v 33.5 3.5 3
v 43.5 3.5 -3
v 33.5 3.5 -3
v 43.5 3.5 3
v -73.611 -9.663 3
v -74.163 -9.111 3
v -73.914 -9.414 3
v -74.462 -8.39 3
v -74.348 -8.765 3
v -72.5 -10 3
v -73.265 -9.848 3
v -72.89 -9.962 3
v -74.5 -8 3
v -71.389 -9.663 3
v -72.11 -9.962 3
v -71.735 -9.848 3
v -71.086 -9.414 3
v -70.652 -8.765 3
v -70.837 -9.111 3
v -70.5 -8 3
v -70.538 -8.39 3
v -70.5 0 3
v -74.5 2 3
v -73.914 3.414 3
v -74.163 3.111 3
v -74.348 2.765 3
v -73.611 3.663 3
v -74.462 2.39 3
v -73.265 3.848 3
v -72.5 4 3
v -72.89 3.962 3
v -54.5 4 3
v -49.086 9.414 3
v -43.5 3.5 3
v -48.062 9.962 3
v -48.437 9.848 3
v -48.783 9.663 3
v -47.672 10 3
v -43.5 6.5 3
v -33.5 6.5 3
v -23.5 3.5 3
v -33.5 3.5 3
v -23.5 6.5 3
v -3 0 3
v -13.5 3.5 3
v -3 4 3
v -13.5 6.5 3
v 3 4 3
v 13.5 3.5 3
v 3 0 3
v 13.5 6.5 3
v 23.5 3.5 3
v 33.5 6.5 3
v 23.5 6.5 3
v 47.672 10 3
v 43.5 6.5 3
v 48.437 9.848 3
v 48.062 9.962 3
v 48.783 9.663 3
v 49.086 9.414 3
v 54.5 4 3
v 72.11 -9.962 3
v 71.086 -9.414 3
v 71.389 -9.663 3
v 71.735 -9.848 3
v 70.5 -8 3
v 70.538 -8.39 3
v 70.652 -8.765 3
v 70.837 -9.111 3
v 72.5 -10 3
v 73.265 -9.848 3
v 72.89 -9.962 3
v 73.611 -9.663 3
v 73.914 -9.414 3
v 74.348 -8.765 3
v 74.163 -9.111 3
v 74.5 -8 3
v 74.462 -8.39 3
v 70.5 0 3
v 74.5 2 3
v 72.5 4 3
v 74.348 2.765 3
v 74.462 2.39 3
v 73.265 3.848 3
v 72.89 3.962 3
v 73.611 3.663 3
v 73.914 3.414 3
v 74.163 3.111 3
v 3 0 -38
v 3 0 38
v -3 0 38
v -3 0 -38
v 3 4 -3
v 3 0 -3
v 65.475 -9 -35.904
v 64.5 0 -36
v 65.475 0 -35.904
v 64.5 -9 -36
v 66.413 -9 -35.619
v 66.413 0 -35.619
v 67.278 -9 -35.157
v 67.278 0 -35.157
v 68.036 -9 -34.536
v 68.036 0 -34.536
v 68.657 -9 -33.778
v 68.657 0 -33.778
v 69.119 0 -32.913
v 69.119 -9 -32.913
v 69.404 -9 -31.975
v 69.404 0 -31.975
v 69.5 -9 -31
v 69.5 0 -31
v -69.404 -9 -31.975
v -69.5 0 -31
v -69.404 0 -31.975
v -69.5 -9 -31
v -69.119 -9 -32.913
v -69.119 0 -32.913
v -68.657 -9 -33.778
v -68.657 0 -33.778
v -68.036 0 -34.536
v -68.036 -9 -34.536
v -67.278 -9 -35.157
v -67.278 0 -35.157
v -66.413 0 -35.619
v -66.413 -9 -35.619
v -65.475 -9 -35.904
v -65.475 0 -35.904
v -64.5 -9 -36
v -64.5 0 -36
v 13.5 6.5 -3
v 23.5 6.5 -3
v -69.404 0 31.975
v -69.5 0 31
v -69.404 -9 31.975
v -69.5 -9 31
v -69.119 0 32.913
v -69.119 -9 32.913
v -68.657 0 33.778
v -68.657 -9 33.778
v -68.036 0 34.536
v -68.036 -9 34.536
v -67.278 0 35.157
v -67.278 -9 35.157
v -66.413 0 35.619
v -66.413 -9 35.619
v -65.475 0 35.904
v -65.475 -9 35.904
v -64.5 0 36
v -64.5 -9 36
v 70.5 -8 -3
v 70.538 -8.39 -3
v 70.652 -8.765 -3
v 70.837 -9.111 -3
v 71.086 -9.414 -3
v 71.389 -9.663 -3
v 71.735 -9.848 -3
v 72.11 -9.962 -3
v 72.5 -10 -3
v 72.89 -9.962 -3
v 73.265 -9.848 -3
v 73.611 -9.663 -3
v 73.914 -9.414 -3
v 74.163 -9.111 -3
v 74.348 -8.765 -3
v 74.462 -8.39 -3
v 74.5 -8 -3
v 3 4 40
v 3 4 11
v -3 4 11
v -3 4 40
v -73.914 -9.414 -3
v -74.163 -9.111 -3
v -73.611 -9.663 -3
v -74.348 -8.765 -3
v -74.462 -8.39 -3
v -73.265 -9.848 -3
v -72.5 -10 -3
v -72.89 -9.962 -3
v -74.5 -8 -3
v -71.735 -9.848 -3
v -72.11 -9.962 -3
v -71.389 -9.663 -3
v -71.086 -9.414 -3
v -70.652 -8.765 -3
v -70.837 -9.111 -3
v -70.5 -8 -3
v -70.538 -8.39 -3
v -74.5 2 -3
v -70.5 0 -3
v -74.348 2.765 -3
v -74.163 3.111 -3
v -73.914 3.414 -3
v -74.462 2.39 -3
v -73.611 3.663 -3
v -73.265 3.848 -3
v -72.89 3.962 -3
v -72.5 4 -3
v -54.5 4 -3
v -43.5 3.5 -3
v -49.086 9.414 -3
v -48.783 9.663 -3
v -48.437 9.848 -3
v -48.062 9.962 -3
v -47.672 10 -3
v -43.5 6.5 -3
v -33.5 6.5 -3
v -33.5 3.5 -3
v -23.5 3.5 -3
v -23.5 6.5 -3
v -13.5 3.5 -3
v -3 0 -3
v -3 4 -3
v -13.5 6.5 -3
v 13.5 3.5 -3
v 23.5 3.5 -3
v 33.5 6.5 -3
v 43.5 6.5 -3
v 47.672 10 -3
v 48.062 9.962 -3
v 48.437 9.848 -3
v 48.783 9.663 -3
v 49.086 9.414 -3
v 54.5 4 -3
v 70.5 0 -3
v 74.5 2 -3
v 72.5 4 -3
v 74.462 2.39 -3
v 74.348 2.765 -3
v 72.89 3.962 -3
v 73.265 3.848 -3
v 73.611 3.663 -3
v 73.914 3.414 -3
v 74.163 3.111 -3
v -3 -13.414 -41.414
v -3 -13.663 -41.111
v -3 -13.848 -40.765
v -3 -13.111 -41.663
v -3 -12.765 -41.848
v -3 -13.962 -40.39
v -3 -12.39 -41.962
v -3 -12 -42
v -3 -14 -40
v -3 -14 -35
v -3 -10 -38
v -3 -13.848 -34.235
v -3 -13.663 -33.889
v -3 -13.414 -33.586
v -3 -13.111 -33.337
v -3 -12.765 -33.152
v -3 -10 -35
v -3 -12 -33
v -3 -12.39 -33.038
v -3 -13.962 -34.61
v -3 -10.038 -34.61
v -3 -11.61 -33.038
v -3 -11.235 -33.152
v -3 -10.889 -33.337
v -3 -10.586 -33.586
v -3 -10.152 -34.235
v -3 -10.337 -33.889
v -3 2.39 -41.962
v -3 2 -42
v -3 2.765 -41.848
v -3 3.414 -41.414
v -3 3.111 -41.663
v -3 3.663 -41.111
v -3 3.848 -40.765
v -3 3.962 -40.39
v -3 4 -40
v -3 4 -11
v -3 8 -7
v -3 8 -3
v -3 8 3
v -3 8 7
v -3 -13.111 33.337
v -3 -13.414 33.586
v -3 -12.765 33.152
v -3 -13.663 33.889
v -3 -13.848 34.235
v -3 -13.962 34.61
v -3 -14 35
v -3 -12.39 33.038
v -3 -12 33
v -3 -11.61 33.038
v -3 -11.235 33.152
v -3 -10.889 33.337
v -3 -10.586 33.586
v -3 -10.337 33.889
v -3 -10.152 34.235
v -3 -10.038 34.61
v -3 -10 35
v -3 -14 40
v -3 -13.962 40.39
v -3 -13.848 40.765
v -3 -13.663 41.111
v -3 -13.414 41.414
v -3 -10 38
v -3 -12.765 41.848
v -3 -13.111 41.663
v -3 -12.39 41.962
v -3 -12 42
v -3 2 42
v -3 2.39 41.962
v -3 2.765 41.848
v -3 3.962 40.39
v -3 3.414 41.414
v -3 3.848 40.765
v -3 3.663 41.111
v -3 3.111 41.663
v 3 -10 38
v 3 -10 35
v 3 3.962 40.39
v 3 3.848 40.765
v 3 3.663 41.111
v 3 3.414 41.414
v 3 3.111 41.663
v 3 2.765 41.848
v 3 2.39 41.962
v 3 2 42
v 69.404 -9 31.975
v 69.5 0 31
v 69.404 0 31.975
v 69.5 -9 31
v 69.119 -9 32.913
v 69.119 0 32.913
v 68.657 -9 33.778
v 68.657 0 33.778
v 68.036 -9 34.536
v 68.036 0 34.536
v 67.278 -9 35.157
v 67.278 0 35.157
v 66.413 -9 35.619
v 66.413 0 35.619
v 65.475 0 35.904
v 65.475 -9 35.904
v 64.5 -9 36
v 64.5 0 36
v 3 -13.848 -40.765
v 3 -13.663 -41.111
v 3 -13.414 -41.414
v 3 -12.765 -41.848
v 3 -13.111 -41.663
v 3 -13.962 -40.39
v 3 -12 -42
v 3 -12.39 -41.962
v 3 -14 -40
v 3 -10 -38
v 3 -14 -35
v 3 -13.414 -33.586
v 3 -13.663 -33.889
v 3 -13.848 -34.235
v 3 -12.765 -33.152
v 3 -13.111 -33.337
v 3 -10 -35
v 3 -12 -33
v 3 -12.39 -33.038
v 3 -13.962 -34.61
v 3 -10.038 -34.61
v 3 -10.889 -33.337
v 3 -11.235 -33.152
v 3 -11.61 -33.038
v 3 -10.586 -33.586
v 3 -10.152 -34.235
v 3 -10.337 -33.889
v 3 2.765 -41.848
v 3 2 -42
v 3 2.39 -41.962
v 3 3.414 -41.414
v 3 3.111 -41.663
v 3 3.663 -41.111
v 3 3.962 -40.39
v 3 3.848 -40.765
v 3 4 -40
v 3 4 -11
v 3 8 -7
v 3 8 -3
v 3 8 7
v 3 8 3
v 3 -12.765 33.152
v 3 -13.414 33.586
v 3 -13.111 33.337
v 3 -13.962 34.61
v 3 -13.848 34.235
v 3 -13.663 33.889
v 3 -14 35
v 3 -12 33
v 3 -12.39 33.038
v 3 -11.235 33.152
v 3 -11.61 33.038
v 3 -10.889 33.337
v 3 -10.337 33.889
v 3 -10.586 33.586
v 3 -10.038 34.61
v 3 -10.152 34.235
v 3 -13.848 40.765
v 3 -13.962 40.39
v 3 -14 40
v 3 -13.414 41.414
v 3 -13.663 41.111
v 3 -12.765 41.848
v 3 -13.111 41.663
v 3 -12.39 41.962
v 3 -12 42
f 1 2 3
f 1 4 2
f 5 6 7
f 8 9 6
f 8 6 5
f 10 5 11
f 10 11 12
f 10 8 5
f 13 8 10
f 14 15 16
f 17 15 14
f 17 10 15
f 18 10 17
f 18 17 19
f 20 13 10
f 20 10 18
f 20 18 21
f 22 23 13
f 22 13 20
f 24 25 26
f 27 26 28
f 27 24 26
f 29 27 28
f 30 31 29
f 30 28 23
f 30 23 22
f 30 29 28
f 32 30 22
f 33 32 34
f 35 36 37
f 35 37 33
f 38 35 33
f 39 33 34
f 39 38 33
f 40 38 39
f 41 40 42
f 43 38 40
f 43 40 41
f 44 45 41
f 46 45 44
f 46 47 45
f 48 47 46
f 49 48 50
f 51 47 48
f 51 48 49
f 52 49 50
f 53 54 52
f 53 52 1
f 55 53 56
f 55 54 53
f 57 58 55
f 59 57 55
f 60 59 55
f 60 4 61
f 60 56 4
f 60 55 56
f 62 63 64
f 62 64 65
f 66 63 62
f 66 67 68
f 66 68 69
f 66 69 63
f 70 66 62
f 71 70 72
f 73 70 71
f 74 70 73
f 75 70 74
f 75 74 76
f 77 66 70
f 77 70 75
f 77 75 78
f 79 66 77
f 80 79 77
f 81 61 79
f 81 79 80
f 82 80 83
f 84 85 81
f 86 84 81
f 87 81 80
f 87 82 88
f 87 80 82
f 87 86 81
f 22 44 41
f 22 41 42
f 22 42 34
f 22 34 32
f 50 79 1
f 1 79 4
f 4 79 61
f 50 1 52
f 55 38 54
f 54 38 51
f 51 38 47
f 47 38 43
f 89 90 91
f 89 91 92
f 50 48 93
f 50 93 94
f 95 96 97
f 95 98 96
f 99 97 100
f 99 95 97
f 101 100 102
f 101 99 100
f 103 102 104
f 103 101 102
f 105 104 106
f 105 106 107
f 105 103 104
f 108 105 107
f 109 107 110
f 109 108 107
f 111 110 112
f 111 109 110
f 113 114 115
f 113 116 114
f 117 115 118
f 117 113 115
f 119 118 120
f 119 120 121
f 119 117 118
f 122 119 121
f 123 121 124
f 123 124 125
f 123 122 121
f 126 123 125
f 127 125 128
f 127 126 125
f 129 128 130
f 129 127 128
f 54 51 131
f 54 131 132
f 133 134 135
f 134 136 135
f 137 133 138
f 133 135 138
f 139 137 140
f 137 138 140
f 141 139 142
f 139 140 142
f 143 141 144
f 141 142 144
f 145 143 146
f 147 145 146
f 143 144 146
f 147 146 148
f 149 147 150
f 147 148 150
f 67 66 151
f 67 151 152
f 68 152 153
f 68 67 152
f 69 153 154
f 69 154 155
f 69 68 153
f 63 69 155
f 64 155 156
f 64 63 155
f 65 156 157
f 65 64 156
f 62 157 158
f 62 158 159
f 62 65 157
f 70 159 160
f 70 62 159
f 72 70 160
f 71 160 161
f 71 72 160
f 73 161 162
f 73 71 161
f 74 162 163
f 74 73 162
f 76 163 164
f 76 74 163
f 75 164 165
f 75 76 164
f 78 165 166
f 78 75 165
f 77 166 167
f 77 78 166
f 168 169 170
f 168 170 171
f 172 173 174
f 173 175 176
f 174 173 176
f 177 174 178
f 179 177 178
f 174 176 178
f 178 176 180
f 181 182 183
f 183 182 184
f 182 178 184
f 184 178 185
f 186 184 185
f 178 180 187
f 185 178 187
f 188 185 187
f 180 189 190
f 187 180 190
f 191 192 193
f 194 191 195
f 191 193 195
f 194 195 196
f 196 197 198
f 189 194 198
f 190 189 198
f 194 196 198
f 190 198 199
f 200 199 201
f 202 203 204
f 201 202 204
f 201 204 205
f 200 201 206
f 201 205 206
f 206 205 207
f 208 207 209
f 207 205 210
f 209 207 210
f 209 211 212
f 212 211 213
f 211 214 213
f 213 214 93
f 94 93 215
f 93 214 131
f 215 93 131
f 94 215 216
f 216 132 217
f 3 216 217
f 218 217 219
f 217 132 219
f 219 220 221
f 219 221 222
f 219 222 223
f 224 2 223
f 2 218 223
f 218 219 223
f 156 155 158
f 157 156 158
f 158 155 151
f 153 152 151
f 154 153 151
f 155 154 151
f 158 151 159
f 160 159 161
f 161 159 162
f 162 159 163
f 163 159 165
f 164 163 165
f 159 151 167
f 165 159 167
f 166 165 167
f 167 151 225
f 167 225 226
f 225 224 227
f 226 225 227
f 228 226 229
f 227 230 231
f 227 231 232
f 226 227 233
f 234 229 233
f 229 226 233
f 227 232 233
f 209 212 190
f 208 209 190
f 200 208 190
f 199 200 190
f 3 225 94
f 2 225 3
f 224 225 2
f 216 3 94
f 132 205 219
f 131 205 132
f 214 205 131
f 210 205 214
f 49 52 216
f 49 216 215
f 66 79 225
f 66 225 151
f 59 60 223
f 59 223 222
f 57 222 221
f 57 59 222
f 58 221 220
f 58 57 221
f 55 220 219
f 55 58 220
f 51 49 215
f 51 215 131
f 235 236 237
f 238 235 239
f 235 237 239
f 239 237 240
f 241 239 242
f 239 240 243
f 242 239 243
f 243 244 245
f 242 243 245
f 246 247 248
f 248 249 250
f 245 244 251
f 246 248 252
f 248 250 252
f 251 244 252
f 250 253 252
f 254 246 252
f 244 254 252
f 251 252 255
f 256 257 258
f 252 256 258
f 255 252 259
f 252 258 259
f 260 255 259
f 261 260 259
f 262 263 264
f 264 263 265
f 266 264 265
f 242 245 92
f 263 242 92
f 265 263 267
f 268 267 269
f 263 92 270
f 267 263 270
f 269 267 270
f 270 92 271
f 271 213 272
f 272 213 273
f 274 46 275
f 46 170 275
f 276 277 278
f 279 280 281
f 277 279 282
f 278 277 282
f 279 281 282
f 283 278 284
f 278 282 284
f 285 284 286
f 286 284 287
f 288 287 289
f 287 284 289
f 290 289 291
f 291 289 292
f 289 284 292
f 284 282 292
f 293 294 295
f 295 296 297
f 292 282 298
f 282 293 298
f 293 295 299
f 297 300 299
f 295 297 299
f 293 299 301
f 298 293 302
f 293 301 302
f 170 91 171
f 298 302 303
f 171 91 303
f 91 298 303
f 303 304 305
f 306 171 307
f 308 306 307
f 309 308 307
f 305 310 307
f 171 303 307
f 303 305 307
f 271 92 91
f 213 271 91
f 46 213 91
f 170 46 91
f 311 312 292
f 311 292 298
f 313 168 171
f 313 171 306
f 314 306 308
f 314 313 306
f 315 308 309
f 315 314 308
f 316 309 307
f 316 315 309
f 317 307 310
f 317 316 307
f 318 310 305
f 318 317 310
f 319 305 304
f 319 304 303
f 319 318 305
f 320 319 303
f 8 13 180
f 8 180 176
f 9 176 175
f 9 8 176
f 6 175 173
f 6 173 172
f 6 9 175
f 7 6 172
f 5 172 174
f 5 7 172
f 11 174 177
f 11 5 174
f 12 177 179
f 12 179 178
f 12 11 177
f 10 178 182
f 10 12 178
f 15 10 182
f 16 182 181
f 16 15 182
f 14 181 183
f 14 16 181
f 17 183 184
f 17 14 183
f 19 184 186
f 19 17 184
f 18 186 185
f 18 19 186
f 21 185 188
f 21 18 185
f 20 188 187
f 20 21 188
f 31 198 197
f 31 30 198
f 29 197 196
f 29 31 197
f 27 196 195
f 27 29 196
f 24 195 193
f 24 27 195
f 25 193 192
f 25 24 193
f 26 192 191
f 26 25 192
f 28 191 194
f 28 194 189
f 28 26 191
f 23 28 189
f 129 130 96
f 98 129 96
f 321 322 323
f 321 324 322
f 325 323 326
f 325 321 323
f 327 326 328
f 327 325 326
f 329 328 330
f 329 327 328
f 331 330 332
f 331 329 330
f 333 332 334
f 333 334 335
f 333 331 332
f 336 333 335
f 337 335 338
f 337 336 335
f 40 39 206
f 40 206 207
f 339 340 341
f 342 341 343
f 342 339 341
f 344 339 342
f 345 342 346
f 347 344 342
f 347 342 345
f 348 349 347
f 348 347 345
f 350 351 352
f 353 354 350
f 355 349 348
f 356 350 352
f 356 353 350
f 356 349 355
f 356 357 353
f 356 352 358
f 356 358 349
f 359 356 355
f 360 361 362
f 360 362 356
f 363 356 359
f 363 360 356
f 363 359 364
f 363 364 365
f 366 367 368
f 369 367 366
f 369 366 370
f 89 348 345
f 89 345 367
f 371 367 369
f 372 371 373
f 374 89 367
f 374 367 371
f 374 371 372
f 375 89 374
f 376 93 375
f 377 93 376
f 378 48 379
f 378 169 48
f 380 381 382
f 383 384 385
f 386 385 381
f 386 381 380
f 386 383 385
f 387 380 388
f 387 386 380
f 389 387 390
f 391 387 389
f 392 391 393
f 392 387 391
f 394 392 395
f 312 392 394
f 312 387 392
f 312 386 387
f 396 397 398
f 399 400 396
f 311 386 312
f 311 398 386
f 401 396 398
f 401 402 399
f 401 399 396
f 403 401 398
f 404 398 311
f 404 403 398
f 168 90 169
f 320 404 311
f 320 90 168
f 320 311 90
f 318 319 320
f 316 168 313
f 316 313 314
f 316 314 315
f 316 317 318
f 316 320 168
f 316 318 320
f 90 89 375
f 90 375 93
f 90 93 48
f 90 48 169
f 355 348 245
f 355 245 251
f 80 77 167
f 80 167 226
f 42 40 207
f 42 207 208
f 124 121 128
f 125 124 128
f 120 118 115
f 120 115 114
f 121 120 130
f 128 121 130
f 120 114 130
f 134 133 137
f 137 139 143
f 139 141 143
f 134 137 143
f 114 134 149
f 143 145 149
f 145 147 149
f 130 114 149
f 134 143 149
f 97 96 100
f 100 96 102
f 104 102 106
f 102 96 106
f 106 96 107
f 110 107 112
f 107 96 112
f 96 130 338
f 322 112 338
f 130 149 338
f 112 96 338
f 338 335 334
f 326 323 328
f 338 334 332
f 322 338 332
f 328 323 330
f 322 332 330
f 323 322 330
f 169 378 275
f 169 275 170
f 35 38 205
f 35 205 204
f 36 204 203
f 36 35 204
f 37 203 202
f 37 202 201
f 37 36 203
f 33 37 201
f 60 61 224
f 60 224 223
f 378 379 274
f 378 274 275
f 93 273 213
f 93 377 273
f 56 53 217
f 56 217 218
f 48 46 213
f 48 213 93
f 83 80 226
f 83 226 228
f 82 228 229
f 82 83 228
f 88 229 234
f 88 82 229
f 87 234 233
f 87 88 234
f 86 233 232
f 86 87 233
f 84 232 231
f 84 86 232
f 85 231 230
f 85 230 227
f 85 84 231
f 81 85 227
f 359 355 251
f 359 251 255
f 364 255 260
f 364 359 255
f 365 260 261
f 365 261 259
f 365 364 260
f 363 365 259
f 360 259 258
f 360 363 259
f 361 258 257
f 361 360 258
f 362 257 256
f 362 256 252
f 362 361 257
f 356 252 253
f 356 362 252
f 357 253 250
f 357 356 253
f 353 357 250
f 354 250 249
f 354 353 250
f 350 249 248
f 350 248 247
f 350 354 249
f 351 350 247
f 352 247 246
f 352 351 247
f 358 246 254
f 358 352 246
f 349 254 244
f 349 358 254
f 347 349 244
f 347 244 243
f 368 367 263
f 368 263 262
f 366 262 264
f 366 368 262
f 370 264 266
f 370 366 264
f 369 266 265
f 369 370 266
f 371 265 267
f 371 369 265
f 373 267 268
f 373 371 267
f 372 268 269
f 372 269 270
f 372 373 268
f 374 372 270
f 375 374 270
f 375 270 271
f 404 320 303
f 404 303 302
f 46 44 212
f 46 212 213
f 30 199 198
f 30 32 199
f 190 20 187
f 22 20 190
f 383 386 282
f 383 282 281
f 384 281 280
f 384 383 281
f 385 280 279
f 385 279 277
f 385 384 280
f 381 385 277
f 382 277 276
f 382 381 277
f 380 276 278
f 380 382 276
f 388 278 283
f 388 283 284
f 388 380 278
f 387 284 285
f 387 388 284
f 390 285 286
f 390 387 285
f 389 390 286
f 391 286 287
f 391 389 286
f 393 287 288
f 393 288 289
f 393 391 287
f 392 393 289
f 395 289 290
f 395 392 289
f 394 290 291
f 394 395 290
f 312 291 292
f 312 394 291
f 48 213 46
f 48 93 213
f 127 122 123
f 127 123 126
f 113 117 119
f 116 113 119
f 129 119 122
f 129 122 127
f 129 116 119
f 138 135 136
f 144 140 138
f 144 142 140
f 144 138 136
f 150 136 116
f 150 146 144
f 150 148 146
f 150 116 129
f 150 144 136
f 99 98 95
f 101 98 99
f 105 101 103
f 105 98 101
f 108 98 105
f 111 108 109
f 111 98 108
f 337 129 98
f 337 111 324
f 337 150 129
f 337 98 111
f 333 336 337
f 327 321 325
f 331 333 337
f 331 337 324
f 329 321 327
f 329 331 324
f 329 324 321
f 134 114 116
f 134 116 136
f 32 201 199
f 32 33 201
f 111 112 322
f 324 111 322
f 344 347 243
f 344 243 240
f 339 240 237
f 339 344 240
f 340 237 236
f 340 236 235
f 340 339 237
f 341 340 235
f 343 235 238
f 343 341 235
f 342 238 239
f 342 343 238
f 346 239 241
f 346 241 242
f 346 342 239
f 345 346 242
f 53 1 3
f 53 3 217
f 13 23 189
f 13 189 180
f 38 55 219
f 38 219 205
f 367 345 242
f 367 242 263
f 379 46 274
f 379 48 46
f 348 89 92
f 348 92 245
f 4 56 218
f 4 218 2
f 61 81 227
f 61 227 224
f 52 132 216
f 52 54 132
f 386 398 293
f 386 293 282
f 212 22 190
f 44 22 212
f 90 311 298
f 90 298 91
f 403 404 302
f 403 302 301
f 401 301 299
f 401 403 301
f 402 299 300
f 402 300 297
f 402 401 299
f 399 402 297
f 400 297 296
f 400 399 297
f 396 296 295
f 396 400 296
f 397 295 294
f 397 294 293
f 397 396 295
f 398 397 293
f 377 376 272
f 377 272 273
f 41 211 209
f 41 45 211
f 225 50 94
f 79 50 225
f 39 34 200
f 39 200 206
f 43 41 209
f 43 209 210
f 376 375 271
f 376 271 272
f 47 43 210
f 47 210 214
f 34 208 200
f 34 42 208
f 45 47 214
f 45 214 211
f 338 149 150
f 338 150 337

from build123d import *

# Parameters (mm, degrees)
F0_W     = 139
F0_H     = 72
F1_DEPTH = 9
F2_R     = 5
F4_DEPTH = 3
F6_DEPTH = 3


with BuildPart() as f1:
    # F0 (on Front) → F1 (new body)
    with BuildSketch(Plane.XZ):
        Rectangle(F0_W, F0_H)
    extrude(amount=F1_DEPTH)

    # F2
    f2_edges = [f1.edges().sort_by_distance(p)[0] for p in [
        (-69.5, -4.5, 36),
        (69.5, -4.5, 36),
        (69.5, -4.5, -36),
        (-69.5, -4.5, -36),
    ]]
    fillet(f2_edges, radius=F2_R)


with BuildPart() as f4:
    # F3 (on Top) → F4 (new body, symmetric)
    with BuildSketch(Plane.XY):
        with BuildLine():
            Line((-54.5, 4), (-72.5, 4))
            ThreePointArc((-72.5, 4), (-73.9142135624, 3.4142135624), (-74.5, 2))
            Line((-74.5, 2), (-74.5, 0))
            Line((-74.5, 0), (-70.5, 0))
            Line((-70.5, 0), (-3, 0))
            Line((-3, 0), (-3, 4))
            Line((-3, 4), (-13.5, 4))
            Line((-13.5, 4), (-13.5, 3.5))
            Line((-13.5, 3.5), (-23.5, 3.5))
            Line((-23.5, 3.5), (-23.5, 4))
            Line((-23.5, 4), (-33.5, 4))
            Line((-33.5, 4), (-33.5, 3.5))
            Line((-33.5, 3.5), (-43.5, 3.5))
            Line((-43.5, 3.5), (-43.5, 4))
            Line((-43.5, 4), (-54.5, 4))
        make_face()
        with BuildLine():
            Line((3, 4), (3, 0))
            Line((3, 0), (70.5, 0))
            Line((70.5, 0), (74.5, 0))
            Line((74.5, 0), (74.5, 2))
            ThreePointArc((74.5, 2), (73.9142135624, 3.4142135624), (72.5, 4))
            Line((72.5, 4), (54.5, 4))
            Line((54.5, 4), (43.5, 4))
            Line((43.5, 4), (43.5, 3.5))
            Line((43.5, 3.5), (33.5, 3.5))
            Line((33.5, 3.5), (33.5, 4))
            Line((33.5, 4), (23.5, 4))
            Line((23.5, 4), (23.5, 3.5))
            Line((23.5, 3.5), (13.5, 3.5))
            Line((13.5, 3.5), (13.5, 4))
            Line((13.5, 4), (3, 4))
        make_face()
        with BuildLine():
            Line((-70.5, 0), (-74.5, 0))
            Line((-74.5, 0), (-74.5, -8))
            ThreePointArc((-74.5, -8), (-73.9142135624, -9.4142135624), (-72.5, -10))
            ThreePointArc((-72.5, -10), (-71.0857864376, -9.4142135624), (-70.5, -8))
            Line((-70.5, -8), (-70.5, 0))
        make_face()
        with BuildLine():
            Line((74.5, 0), (70.5, 0))
            Line((70.5, 0), (70.5, -8))
            ThreePointArc((70.5, -8), (71.0857864376, -9.4142135624), (72.5, -10))
            ThreePointArc((72.5, -10), (73.9142135624, -9.4142135624), (74.5, -8))
            Line((74.5, -8), (74.5, 0))
        make_face()
        with BuildLine():
            Line((47.6715728753, 10), (0, 10))
            Line((0, 10), (0, 4))
            Line((0, 4), (3, 4))
            Line((3, 4), (13.5, 4))
            Line((13.5, 4), (13.5, 6.5))
            Line((13.5, 6.5), (23.5, 6.5))
            Line((23.5, 6.5), (23.5, 4))
            Line((23.5, 4), (33.5, 4))
            Line((33.5, 4), (33.5, 6.5))
            Line((33.5, 6.5), (43.5, 6.5))
            Line((43.5, 6.5), (43.5, 4))
            Line((43.5, 4), (54.5, 4))
            Line((54.5, 4), (49.0857864376, 9.4142135624))
            ThreePointArc((49.0857864376, 9.4142135624), (48.43693974, 9.847759065), (47.6715728753, 10))
        make_face()
        with BuildLine():
            Line((-49.0857864376, 9.4142135624), (-54.5, 4))
            Line((-54.5, 4), (-43.5, 4))
            Line((-43.5, 4), (-43.5, 6.5))
            Line((-43.5, 6.5), (-33.5, 6.5))
            Line((-33.5, 6.5), (-33.5, 4))
            Line((-33.5, 4), (-23.5, 4))
            Line((-23.5, 4), (-23.5, 6.5))
            Line((-23.5, 6.5), (-13.5, 6.5))
            Line((-13.5, 6.5), (-13.5, 4))
            Line((-13.5, 4), (-3, 4))
            Line((-3, 4), (0, 4))
            Line((0, 4), (0, 10))
            Line((0, 10), (-47.6715728753, 10))
            ThreePointArc((-47.6715728753, 10), (-48.43693974, 9.847759065), (-49.0857864376, 9.4142135624))
        make_face()
    extrude(amount=F4_DEPTH, both=True)


with BuildPart() as f6:
    # F5 (on Right) → F6 (new body, symmetric)
    with BuildSketch(Plane.YZ):
        Polygon((4, 11), (4, 3), (8, 3), (8, 7), align=None)
        with BuildLine():
            Line((-10, 38), (0, 38))
            Line((0, 38), (0, 0))
            Line((0, 0), (4, 0))
            Line((4, 0), (4, 3))
            Line((4, 3), (4, 11))
            Line((4, 11), (4, 40))
            ThreePointArc((4, 40), (3.4142135624, 41.4142135624), (2, 42))
            Line((2, 42), (-12, 42))
            ThreePointArc((-12, 42), (-13.4142135624, 41.4142135624), (-14, 40))
            Line((-14, 40), (-14, 35))
            ThreePointArc((-14, 35), (-13.4142135624, 33.5857864376), (-12, 33))
            ThreePointArc((-12, 33), (-10.5857864376, 33.5857864376), (-10, 35))
            Line((-10, 35), (-10, 38))
        make_face()
        with BuildLine():
            Line((4, 0), (0, 0))
            Line((0, 0), (0, -38))
            Line((0, -38), (-10, -38))
            Line((-10, -38), (-10, -35))
            ThreePointArc((-10, -35), (-10.5857864376, -33.5857864376), (-12, -33))
            ThreePointArc((-12, -33), (-13.4142135624, -33.5857864376), (-14, -35))
            Line((-14, -35), (-14, -40))
            ThreePointArc((-14, -40), (-13.4142135624, -41.4142135624), (-12, -42))
            Line((-12, -42), (2, -42))
            ThreePointArc((2, -42), (3.4142135624, -41.4142135624), (4, -40))
            Line((4, -40), (4, -11))
            Line((4, -11), (4, -3))
            Line((4, -3), (4, 0))
        make_face()
        Polygon((8, -3), (4, -3), (4, -11), (8, -7), align=None)
    extrude(amount=F6_DEPTH, both=True)


solid = Compound([f1.part, f4.part, f6.part])
